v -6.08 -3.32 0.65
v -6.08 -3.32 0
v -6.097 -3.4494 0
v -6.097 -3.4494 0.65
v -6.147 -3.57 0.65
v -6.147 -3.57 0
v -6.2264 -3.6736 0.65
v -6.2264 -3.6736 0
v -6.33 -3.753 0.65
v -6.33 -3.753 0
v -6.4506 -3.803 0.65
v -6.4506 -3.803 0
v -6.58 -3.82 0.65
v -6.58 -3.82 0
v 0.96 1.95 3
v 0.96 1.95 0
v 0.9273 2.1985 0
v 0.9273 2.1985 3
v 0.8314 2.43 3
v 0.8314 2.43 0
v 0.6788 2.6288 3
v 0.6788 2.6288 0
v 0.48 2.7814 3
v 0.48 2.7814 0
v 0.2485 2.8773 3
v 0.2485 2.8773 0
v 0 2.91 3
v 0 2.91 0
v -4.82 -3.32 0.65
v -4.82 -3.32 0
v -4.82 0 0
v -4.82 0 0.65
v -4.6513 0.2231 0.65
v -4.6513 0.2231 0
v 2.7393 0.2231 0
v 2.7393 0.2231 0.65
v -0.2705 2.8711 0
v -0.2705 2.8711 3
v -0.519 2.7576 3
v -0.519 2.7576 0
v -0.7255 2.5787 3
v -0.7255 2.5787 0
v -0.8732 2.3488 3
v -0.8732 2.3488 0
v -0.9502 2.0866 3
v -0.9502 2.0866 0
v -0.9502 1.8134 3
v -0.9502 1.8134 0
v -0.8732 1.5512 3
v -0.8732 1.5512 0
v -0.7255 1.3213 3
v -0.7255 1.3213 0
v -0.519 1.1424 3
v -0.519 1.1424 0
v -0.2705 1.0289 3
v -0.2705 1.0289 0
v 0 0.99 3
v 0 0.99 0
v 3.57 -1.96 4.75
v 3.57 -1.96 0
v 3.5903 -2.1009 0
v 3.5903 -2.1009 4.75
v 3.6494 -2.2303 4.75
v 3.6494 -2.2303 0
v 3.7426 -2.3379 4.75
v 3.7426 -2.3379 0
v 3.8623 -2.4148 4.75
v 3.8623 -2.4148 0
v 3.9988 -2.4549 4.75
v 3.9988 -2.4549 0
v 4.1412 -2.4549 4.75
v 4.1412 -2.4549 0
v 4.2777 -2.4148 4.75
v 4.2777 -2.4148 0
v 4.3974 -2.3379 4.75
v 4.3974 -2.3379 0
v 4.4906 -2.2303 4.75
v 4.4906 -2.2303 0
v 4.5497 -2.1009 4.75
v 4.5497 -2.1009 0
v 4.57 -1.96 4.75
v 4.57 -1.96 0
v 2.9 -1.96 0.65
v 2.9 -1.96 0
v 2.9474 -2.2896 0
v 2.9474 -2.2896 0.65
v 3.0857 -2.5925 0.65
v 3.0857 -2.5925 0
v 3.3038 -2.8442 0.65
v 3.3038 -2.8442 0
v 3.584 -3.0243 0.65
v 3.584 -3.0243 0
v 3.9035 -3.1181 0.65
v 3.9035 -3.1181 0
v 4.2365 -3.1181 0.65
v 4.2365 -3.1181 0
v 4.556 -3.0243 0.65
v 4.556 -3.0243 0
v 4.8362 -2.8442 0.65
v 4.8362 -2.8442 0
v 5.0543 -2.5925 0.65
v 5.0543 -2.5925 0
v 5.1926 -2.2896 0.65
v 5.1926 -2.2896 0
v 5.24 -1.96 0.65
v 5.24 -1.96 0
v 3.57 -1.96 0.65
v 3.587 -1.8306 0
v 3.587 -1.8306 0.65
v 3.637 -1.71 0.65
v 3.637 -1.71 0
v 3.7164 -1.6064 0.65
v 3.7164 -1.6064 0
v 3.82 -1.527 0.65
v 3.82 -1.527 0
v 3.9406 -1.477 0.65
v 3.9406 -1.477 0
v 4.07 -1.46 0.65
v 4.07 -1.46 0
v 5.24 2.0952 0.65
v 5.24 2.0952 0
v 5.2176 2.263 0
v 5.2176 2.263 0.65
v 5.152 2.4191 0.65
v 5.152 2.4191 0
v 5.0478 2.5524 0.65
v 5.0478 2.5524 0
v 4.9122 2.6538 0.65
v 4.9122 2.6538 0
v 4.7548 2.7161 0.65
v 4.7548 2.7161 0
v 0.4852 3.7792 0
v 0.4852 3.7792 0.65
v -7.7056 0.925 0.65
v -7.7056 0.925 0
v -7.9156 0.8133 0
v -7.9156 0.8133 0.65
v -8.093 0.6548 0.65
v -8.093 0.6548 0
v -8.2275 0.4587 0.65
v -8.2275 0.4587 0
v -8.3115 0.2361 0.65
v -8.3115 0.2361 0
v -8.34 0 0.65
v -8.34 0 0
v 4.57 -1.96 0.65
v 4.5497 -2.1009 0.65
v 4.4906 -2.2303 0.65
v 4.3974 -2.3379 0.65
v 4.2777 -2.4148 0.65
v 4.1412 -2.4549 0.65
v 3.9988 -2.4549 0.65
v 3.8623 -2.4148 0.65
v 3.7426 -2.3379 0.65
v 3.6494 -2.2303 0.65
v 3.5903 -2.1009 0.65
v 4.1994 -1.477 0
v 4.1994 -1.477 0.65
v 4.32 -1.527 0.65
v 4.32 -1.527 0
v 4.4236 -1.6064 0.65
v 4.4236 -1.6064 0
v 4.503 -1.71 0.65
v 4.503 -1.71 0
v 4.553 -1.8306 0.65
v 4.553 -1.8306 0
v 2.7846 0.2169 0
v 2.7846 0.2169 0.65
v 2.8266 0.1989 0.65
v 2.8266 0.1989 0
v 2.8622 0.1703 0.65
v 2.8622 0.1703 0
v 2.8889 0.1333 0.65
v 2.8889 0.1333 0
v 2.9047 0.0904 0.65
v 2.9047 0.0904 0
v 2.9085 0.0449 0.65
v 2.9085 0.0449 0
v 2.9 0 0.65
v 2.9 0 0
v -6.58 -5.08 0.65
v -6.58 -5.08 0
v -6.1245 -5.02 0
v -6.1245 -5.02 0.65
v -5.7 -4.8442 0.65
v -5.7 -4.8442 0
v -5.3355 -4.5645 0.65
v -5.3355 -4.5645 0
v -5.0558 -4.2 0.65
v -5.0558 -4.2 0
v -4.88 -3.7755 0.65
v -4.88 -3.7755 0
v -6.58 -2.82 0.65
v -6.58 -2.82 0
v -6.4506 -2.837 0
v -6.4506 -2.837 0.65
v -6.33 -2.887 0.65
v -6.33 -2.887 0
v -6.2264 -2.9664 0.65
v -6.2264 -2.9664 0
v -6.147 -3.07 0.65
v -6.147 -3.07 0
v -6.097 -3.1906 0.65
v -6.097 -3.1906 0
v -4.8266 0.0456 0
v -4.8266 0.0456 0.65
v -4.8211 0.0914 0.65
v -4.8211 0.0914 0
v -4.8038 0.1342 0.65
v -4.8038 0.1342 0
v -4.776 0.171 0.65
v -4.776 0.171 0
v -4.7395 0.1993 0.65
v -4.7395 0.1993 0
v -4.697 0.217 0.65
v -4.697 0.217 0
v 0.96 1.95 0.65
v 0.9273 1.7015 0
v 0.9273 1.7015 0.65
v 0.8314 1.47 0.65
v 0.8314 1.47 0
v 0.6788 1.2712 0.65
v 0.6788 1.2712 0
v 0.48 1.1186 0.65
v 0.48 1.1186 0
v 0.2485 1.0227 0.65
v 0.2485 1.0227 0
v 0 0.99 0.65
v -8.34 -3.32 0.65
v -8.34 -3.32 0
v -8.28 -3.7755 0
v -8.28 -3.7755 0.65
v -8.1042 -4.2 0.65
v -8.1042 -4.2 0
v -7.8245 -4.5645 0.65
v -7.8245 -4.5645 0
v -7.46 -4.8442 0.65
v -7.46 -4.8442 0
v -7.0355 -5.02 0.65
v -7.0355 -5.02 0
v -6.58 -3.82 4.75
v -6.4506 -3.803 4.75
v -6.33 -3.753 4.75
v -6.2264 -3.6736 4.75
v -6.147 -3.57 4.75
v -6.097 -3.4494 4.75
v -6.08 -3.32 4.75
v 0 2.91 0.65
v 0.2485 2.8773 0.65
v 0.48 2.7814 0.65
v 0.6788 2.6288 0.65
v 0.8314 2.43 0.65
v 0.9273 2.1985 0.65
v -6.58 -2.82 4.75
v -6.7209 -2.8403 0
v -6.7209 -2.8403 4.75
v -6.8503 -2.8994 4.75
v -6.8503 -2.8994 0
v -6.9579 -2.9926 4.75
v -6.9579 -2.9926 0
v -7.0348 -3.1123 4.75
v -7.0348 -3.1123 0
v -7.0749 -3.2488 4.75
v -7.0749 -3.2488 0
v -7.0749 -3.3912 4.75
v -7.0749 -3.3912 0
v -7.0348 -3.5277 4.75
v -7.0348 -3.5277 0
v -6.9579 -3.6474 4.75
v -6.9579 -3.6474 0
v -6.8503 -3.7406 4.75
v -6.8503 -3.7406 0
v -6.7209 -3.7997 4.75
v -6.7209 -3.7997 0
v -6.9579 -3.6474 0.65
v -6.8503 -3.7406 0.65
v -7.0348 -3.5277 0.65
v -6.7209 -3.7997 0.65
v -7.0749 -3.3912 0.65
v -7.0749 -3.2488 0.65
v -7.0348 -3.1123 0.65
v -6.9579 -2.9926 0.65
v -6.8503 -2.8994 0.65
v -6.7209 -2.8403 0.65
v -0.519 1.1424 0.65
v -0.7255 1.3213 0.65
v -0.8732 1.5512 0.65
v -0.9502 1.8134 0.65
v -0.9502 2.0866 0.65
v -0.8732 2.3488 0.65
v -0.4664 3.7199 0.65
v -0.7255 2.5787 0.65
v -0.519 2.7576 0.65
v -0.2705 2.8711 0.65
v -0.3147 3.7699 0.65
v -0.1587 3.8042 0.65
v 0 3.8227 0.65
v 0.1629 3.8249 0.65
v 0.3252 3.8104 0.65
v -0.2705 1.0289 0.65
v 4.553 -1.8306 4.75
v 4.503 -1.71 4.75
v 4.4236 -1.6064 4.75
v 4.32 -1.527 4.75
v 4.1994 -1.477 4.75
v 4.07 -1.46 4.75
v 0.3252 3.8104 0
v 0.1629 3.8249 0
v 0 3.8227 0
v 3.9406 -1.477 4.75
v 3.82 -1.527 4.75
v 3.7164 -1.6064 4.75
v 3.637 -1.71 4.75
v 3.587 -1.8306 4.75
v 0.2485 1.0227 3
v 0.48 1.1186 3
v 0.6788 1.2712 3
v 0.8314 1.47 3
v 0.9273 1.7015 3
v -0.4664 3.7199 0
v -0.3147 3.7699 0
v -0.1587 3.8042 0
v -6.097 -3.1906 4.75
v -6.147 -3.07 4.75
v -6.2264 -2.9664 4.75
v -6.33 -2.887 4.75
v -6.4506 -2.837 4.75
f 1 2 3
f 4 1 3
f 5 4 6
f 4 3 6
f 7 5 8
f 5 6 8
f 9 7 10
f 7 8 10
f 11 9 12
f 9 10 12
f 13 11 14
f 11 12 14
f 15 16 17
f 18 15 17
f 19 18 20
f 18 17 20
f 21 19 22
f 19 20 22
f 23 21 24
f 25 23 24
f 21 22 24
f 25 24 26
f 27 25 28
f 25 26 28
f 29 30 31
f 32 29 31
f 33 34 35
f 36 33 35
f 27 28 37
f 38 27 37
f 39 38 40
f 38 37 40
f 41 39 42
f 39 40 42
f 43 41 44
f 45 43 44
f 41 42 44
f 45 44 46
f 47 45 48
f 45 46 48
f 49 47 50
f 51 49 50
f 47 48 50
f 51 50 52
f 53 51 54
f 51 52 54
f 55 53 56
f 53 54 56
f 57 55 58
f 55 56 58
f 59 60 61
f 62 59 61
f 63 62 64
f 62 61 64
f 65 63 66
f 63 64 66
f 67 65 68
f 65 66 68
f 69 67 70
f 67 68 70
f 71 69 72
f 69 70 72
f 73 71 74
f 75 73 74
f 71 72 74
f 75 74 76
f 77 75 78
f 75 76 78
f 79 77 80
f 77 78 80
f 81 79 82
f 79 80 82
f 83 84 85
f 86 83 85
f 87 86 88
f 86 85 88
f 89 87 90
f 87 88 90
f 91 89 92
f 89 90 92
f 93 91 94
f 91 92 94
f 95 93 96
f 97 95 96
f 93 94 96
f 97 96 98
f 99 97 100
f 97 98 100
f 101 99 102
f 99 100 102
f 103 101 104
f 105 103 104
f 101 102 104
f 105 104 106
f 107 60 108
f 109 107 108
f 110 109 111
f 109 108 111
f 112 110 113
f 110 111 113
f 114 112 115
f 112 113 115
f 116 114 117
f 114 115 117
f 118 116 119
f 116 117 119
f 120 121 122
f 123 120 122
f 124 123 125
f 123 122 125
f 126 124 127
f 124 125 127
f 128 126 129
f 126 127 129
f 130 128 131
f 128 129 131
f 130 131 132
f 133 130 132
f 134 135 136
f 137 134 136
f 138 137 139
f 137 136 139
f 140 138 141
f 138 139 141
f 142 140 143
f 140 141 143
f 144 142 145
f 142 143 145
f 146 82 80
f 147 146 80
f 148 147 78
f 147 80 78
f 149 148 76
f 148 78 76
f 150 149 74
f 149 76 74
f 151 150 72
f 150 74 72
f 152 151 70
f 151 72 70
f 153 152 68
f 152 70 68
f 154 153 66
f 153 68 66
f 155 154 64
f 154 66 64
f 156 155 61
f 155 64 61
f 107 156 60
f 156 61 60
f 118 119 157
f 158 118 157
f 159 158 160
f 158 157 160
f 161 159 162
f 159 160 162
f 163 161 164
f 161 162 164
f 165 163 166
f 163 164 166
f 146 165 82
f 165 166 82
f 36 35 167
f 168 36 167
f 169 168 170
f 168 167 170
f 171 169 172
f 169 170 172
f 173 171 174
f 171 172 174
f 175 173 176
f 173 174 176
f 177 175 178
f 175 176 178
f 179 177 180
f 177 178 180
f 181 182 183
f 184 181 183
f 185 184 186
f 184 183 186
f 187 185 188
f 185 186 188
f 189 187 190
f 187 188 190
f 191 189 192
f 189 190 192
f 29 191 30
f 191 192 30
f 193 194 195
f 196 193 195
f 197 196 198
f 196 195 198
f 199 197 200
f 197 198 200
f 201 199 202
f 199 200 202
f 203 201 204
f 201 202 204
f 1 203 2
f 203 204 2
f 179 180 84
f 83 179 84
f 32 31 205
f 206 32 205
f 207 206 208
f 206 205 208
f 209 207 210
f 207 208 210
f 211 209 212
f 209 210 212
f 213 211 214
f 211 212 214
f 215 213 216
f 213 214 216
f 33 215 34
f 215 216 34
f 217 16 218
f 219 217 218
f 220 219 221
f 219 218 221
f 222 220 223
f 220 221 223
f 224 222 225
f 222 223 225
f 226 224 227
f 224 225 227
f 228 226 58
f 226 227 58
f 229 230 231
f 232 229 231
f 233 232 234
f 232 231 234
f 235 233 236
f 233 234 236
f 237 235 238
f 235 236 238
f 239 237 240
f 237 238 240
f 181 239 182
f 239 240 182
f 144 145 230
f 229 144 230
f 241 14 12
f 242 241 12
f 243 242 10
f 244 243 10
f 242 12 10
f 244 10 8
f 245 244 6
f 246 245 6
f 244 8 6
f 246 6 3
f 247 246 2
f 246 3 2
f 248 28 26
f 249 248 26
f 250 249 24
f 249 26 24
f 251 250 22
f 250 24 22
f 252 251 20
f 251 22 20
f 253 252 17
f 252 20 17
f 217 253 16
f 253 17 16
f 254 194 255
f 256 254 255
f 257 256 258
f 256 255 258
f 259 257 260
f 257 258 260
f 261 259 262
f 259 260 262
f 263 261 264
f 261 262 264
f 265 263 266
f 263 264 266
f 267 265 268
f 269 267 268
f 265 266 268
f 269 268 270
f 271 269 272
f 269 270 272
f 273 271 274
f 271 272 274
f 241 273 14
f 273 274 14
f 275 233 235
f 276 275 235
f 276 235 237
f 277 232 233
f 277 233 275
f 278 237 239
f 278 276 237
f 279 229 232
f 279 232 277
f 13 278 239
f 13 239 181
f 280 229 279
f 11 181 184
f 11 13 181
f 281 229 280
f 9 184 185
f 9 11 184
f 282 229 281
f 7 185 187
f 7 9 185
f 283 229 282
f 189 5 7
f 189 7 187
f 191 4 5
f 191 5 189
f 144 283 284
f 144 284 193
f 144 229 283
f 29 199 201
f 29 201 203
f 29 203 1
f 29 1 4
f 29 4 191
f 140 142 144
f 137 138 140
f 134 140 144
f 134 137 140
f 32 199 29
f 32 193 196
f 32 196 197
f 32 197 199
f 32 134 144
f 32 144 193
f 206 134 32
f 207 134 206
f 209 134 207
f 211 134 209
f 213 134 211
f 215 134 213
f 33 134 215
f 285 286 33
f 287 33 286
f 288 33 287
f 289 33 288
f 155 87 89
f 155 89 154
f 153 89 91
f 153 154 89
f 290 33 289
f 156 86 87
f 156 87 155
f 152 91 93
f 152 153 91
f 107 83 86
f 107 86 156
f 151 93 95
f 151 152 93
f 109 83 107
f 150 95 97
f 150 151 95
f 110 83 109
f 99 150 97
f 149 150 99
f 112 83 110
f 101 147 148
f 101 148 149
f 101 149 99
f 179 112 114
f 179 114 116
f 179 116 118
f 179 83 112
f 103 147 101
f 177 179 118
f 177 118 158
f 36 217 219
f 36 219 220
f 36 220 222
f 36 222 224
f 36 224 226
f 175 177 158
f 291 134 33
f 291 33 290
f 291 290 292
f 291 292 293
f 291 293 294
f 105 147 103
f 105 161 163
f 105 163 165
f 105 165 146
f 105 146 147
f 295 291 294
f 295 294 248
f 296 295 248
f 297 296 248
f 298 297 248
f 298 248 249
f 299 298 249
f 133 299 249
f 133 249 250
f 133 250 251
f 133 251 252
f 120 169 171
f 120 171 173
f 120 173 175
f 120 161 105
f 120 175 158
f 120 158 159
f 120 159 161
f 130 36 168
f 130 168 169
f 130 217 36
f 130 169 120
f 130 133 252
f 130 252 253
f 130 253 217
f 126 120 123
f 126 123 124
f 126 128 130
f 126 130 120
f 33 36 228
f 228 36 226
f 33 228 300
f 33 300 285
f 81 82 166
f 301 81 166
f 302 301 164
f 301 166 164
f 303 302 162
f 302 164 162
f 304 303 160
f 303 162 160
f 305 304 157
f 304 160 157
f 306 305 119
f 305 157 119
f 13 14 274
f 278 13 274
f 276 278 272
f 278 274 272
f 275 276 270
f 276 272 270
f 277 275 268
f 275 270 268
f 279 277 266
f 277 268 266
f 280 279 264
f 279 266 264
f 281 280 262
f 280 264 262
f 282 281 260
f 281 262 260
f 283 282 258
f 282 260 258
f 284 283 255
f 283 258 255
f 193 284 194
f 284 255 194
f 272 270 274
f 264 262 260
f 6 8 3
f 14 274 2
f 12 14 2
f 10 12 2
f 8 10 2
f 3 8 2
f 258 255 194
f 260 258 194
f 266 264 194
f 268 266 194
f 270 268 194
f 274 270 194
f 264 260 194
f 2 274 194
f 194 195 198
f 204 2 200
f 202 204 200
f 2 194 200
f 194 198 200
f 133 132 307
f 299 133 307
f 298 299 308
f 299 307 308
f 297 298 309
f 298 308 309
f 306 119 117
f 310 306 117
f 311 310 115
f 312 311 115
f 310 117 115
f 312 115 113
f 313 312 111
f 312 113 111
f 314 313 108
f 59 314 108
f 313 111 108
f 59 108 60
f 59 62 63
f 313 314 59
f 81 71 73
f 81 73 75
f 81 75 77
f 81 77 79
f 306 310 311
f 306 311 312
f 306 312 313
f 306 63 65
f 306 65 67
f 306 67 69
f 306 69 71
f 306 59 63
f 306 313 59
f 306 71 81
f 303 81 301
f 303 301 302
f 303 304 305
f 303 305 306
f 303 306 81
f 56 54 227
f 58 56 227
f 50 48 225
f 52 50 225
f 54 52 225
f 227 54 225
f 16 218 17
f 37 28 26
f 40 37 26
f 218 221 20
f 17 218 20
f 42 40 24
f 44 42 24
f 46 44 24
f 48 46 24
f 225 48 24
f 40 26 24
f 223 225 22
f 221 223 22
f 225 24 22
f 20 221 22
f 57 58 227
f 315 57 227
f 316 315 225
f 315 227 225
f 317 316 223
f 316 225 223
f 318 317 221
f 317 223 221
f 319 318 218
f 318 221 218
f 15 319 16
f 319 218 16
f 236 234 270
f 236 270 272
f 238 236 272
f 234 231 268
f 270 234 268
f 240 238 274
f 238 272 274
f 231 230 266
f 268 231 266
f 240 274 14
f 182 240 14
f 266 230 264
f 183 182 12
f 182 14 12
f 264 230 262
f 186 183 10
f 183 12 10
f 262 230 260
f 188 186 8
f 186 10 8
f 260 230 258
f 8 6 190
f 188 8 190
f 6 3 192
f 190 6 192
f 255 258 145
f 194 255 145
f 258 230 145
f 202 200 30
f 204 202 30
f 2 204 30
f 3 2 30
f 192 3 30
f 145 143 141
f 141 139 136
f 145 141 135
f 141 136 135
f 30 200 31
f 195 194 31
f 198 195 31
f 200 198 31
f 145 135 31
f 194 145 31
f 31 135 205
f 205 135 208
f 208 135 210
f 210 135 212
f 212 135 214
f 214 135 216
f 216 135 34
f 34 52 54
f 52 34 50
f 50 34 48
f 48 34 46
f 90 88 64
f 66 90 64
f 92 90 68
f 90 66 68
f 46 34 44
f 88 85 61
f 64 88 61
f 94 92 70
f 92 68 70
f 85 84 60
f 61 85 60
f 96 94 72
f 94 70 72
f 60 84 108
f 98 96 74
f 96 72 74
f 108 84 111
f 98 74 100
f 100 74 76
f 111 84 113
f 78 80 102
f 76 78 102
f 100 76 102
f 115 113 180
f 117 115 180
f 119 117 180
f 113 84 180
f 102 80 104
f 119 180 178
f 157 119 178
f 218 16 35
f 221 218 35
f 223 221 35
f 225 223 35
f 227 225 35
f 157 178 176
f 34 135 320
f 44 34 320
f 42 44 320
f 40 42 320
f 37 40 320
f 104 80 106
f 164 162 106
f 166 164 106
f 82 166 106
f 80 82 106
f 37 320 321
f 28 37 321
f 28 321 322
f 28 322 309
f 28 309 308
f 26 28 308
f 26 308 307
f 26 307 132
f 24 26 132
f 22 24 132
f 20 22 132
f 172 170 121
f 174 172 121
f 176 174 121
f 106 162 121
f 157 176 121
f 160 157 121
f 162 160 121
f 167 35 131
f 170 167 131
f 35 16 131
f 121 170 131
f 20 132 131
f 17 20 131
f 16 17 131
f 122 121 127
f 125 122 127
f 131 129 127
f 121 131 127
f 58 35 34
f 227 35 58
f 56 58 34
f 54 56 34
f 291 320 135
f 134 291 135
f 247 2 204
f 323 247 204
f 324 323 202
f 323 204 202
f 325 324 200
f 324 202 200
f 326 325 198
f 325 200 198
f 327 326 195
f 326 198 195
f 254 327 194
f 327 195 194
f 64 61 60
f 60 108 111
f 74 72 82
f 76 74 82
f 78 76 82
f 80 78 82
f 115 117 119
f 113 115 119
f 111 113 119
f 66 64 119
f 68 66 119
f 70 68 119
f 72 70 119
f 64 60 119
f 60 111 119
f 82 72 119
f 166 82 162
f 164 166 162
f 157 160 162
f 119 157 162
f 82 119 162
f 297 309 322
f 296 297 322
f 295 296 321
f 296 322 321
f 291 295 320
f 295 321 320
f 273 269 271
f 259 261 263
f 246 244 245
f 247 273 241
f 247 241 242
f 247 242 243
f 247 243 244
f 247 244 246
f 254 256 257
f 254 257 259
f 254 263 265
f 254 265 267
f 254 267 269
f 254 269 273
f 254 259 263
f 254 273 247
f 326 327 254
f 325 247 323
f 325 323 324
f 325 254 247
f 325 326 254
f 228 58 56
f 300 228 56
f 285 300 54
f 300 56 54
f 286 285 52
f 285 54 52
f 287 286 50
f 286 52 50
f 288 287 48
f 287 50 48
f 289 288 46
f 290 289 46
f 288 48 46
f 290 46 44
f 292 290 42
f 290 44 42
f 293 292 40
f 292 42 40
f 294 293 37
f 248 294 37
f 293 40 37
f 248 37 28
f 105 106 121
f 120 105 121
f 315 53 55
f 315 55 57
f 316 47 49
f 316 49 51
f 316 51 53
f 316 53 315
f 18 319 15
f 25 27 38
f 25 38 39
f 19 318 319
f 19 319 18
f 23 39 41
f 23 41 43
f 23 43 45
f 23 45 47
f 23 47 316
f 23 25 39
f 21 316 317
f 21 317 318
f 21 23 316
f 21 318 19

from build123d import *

# Parameters (mm, degrees)
F1_DEPTH = 0.65
F2_DEPTH = 3
F3_DEPTH = 4.75
F4_DEPTH = 4.75


with BuildPart() as f1:
    # F0 (on Top) → F1 (new body)
    with BuildSketch(Plane.XY):
        with BuildLine():
            Line((-4.6512614936, 0.2231087419), (0, 0.2231087419))
            Line((0, 0.2231087419), (0, 0.99))
            ThreePointArc((0, 0.99), (-0.96, 1.95), (0, 2.91))
            Line((0, 2.91), (0, 3.8226778984))
            ThreePointArc((0, 3.8226778984), (-0.2371237698, 3.7890083603), (-0.466442953, 3.7199139884))
            Line((-0.466442953, 3.7199139884), (-7.7056375839, 0.9249790882))
            ThreePointArc((-7.7056375839, 0.9249790882), (-8.1661885236, 0.5608143284), (-8.34, 0))
            Line((-8.34, 0), (-6.58, 0))
            Line((-6.58, 0), (-4.82, 0))
            ThreePointArc((-4.82, 0), (-4.7911276745, 0.1535270369), (-4.6512614936, 0.2231087419))
        make_face()
        with BuildLine():
            Line((-4.82, -3.32), (-4.82, 0))
            Line((-4.82, 0), (-6.58, 0))
            Line((-6.58, 0), (-6.58, -1.56))
            ThreePointArc((-6.58, -1.56), (-5.3354920651, -2.0754920651), (-4.82, -3.32))
        make_face()
        with BuildLine():
            Line((-6.58, -1.56), (-6.58, 0))
            Line((-6.58, 0), (-8.34, 0))
            Line((-8.34, 0), (-8.34, -3.32))
            ThreePointArc((-8.34, -3.32), (-7.8245079349, -2.0754920651), (-6.58, -1.56))
        make_face()
        with BuildLine():
            Line((-6.58, -2.82), (-6.58, -1.56))
            ThreePointArc((-6.58, -1.56), (-7.8245079349, -2.0754920651), (-8.34, -3.32))
            ThreePointArc((-8.34, -3.32), (-7.8245079349, -4.5645079349), (-6.58, -5.08))
            Line((-6.58, -5.08), (-6.58, -3.82))
            ThreePointArc((-6.58, -3.82), (-7.08, -3.32), (-6.58, -2.82))
        make_face()
        with BuildLine():
            ThreePointArc((-6.58, -5.08), (-5.3354920651, -4.5645079349), (-4.82, -3.32))
            ThreePointArc((-4.82, -3.32), (-5.3354920651, -2.0754920651), (-6.58, -1.56))
            Line((-6.58, -1.56), (-6.58, -2.82))
            ThreePointArc((-6.58, -2.82), (-6.2264466094, -2.9664466094), (-6.08, -3.32))
            ThreePointArc((-6.08, -3.32), (-6.2264466094, -3.6735533906), (-6.58, -3.82))
            Line((-6.58, -3.82), (-6.58, -5.08))
        make_face()
        with BuildLine():
            Line((0, 0.99), (0, 0.2231087419))
            Line((0, 0.2231087419), (2.7393251657, 0.2231087419))
            ThreePointArc((2.7393251657, 0.2231087419), (2.876796902, 0.152700438), (2.9, 0))
            Line((2.9, 0), (4.07, 0))
            Line((4.07, 0), (5.24, 0))
            Line((5.24, 0), (5.24, 2.0952394856))
            ThreePointArc((5.24, 2.0952394856), (5.1043154194, 2.4891973383), (4.7548148148, 2.7160506443))
            Line((4.7548148148, 2.7160506443), (0.4851851852, 3.7791888413))
            ThreePointArc((0.4851851852, 3.7791888413), (0.2442772634, 3.8197283811), (0, 3.8226778984))
            Line((0, 3.8226778984), (0, 2.91))
            ThreePointArc((0, 2.91), (0.6788225099, 2.6288225099), (0.96, 1.95))
            ThreePointArc((0.96, 1.95), (0.6788225099, 1.2711774901), (0, 0.99))
        make_face()
        with BuildLine():
            Line((4.07, 0), (2.9, 0))
            Line((2.9, 0), (2.9, -1.96))
            ThreePointArc((2.9, -1.96), (3.242685066, -1.132685066), (4.07, -0.79))
            Line((4.07, -0.79), (4.07, 0))
        make_face()
        with BuildLine():
            Line((5.24, 0), (4.07, 0))
            Line((4.07, 0), (4.07, -0.79))
            ThreePointArc((4.07, -0.79), (4.897314934, -1.132685066), (5.24, -1.96))
            Line((5.24, -1.96), (5.24, 0))
        make_face()
        with BuildLine():
            ThreePointArc((5.24, -1.96), (4.897314934, -1.132685066), (4.07, -0.79))
            Line((4.07, -0.79), (4.07, -1.46))
            ThreePointArc((4.07, -1.46), (4.4235533906, -1.6064466094), (4.57, -1.96))
            Line((4.57, -1.96), (5.24, -1.96))
        make_face()
        with BuildLine():
            ThreePointArc((4.07, -0.79), (3.242685066, -1.132685066), (2.9, -1.96))
            Line((2.9, -1.96), (3.57, -1.96))
            ThreePointArc((3.57, -1.96), (3.7164466094, -1.6064466094), (4.07, -1.46))
            Line((4.07, -1.46), (4.07, -0.79))
        make_face()
        with BuildLine():
            Line((3.57, -1.96), (2.9, -1.96))
            ThreePointArc((2.9, -1.96), (4.07, -3.13), (5.24, -1.96))
            Line((5.24, -1.96), (4.57, -1.96))
            ThreePointArc((4.57, -1.96), (4.07, -2.46), (3.57, -1.96))
        make_face()
    extrude(amount=F1_DEPTH)


with BuildPart() as f2:
    # F0 (on Top) → F2 (new body)
    with BuildSketch(Plane.XY):
        with BuildLine():
            ThreePointArc((0, 2.91), (-0.96, 1.95), (0, 0.99))
            Line((0, 0.99), (0, 1.95))
            Line((0, 1.95), (0, 2.91))
        make_face()
        with BuildLine():
            Line((0, 1.95), (0, 0.99))
            ThreePointArc((0, 0.99), (0.6788225099, 1.2711774901), (0.96, 1.95))
            ThreePointArc((0.96, 1.95), (0.6788225099, 2.6288225099), (0, 2.91))
            Line((0, 2.91), (0, 1.95))
        make_face()
    extrude(amount=F2_DEPTH)


with BuildPart() as f3:
    # F0 (on Top) → F3 (new body)
    with BuildSketch(Plane.XY):
        with BuildLine():
            ThreePointArc((-6.08, -3.32), (-6.2264466094, -2.9664466094), (-6.58, -2.82))
            Line((-6.58, -2.82), (-6.58, -3.32))
            Line((-6.58, -3.32), (-6.58, -3.82))
            ThreePointArc((-6.58, -3.82), (-6.2264466094, -3.6735533906), (-6.08, -3.32))
        make_face()
        with BuildLine():
            Line((-6.58, -3.32), (-6.58, -2.82))
            ThreePointArc((-6.58, -2.82), (-7.08, -3.32), (-6.58, -3.82))
            Line((-6.58, -3.82), (-6.58, -3.32))
        make_face()
    extrude(amount=F3_DEPTH)


with BuildPart() as f4:
    # F0 (on Top) → F4 (new body)
    with BuildSketch(Plane.XY):
        with BuildLine():
            ThreePointArc((4.57, -1.96), (4.4235533906, -1.6064466094), (4.07, -1.46))
            Line((4.07, -1.46), (4.07, -1.96))
            Line((4.07, -1.96), (4.57, -1.96))
        make_face()
        with BuildLine():
            ThreePointArc((4.07, -1.46), (3.7164466094, -1.6064466094), (3.57, -1.96))
            Line((3.57, -1.96), (4.07, -1.96))
            Line((4.07, -1.96), (4.07, -1.46))
        make_face()
        with BuildLine():
            Line((4.07, -1.96), (3.57, -1.96))
            ThreePointArc((3.57, -1.96), (4.07, -2.46), (4.57, -1.96))
            Line((4.57, -1.96), (4.07, -1.96))
        make_face()
    extrude(amount=F4_DEPTH)


solid = Compound([f1.part, f2.part, f3.part, f4.part])
